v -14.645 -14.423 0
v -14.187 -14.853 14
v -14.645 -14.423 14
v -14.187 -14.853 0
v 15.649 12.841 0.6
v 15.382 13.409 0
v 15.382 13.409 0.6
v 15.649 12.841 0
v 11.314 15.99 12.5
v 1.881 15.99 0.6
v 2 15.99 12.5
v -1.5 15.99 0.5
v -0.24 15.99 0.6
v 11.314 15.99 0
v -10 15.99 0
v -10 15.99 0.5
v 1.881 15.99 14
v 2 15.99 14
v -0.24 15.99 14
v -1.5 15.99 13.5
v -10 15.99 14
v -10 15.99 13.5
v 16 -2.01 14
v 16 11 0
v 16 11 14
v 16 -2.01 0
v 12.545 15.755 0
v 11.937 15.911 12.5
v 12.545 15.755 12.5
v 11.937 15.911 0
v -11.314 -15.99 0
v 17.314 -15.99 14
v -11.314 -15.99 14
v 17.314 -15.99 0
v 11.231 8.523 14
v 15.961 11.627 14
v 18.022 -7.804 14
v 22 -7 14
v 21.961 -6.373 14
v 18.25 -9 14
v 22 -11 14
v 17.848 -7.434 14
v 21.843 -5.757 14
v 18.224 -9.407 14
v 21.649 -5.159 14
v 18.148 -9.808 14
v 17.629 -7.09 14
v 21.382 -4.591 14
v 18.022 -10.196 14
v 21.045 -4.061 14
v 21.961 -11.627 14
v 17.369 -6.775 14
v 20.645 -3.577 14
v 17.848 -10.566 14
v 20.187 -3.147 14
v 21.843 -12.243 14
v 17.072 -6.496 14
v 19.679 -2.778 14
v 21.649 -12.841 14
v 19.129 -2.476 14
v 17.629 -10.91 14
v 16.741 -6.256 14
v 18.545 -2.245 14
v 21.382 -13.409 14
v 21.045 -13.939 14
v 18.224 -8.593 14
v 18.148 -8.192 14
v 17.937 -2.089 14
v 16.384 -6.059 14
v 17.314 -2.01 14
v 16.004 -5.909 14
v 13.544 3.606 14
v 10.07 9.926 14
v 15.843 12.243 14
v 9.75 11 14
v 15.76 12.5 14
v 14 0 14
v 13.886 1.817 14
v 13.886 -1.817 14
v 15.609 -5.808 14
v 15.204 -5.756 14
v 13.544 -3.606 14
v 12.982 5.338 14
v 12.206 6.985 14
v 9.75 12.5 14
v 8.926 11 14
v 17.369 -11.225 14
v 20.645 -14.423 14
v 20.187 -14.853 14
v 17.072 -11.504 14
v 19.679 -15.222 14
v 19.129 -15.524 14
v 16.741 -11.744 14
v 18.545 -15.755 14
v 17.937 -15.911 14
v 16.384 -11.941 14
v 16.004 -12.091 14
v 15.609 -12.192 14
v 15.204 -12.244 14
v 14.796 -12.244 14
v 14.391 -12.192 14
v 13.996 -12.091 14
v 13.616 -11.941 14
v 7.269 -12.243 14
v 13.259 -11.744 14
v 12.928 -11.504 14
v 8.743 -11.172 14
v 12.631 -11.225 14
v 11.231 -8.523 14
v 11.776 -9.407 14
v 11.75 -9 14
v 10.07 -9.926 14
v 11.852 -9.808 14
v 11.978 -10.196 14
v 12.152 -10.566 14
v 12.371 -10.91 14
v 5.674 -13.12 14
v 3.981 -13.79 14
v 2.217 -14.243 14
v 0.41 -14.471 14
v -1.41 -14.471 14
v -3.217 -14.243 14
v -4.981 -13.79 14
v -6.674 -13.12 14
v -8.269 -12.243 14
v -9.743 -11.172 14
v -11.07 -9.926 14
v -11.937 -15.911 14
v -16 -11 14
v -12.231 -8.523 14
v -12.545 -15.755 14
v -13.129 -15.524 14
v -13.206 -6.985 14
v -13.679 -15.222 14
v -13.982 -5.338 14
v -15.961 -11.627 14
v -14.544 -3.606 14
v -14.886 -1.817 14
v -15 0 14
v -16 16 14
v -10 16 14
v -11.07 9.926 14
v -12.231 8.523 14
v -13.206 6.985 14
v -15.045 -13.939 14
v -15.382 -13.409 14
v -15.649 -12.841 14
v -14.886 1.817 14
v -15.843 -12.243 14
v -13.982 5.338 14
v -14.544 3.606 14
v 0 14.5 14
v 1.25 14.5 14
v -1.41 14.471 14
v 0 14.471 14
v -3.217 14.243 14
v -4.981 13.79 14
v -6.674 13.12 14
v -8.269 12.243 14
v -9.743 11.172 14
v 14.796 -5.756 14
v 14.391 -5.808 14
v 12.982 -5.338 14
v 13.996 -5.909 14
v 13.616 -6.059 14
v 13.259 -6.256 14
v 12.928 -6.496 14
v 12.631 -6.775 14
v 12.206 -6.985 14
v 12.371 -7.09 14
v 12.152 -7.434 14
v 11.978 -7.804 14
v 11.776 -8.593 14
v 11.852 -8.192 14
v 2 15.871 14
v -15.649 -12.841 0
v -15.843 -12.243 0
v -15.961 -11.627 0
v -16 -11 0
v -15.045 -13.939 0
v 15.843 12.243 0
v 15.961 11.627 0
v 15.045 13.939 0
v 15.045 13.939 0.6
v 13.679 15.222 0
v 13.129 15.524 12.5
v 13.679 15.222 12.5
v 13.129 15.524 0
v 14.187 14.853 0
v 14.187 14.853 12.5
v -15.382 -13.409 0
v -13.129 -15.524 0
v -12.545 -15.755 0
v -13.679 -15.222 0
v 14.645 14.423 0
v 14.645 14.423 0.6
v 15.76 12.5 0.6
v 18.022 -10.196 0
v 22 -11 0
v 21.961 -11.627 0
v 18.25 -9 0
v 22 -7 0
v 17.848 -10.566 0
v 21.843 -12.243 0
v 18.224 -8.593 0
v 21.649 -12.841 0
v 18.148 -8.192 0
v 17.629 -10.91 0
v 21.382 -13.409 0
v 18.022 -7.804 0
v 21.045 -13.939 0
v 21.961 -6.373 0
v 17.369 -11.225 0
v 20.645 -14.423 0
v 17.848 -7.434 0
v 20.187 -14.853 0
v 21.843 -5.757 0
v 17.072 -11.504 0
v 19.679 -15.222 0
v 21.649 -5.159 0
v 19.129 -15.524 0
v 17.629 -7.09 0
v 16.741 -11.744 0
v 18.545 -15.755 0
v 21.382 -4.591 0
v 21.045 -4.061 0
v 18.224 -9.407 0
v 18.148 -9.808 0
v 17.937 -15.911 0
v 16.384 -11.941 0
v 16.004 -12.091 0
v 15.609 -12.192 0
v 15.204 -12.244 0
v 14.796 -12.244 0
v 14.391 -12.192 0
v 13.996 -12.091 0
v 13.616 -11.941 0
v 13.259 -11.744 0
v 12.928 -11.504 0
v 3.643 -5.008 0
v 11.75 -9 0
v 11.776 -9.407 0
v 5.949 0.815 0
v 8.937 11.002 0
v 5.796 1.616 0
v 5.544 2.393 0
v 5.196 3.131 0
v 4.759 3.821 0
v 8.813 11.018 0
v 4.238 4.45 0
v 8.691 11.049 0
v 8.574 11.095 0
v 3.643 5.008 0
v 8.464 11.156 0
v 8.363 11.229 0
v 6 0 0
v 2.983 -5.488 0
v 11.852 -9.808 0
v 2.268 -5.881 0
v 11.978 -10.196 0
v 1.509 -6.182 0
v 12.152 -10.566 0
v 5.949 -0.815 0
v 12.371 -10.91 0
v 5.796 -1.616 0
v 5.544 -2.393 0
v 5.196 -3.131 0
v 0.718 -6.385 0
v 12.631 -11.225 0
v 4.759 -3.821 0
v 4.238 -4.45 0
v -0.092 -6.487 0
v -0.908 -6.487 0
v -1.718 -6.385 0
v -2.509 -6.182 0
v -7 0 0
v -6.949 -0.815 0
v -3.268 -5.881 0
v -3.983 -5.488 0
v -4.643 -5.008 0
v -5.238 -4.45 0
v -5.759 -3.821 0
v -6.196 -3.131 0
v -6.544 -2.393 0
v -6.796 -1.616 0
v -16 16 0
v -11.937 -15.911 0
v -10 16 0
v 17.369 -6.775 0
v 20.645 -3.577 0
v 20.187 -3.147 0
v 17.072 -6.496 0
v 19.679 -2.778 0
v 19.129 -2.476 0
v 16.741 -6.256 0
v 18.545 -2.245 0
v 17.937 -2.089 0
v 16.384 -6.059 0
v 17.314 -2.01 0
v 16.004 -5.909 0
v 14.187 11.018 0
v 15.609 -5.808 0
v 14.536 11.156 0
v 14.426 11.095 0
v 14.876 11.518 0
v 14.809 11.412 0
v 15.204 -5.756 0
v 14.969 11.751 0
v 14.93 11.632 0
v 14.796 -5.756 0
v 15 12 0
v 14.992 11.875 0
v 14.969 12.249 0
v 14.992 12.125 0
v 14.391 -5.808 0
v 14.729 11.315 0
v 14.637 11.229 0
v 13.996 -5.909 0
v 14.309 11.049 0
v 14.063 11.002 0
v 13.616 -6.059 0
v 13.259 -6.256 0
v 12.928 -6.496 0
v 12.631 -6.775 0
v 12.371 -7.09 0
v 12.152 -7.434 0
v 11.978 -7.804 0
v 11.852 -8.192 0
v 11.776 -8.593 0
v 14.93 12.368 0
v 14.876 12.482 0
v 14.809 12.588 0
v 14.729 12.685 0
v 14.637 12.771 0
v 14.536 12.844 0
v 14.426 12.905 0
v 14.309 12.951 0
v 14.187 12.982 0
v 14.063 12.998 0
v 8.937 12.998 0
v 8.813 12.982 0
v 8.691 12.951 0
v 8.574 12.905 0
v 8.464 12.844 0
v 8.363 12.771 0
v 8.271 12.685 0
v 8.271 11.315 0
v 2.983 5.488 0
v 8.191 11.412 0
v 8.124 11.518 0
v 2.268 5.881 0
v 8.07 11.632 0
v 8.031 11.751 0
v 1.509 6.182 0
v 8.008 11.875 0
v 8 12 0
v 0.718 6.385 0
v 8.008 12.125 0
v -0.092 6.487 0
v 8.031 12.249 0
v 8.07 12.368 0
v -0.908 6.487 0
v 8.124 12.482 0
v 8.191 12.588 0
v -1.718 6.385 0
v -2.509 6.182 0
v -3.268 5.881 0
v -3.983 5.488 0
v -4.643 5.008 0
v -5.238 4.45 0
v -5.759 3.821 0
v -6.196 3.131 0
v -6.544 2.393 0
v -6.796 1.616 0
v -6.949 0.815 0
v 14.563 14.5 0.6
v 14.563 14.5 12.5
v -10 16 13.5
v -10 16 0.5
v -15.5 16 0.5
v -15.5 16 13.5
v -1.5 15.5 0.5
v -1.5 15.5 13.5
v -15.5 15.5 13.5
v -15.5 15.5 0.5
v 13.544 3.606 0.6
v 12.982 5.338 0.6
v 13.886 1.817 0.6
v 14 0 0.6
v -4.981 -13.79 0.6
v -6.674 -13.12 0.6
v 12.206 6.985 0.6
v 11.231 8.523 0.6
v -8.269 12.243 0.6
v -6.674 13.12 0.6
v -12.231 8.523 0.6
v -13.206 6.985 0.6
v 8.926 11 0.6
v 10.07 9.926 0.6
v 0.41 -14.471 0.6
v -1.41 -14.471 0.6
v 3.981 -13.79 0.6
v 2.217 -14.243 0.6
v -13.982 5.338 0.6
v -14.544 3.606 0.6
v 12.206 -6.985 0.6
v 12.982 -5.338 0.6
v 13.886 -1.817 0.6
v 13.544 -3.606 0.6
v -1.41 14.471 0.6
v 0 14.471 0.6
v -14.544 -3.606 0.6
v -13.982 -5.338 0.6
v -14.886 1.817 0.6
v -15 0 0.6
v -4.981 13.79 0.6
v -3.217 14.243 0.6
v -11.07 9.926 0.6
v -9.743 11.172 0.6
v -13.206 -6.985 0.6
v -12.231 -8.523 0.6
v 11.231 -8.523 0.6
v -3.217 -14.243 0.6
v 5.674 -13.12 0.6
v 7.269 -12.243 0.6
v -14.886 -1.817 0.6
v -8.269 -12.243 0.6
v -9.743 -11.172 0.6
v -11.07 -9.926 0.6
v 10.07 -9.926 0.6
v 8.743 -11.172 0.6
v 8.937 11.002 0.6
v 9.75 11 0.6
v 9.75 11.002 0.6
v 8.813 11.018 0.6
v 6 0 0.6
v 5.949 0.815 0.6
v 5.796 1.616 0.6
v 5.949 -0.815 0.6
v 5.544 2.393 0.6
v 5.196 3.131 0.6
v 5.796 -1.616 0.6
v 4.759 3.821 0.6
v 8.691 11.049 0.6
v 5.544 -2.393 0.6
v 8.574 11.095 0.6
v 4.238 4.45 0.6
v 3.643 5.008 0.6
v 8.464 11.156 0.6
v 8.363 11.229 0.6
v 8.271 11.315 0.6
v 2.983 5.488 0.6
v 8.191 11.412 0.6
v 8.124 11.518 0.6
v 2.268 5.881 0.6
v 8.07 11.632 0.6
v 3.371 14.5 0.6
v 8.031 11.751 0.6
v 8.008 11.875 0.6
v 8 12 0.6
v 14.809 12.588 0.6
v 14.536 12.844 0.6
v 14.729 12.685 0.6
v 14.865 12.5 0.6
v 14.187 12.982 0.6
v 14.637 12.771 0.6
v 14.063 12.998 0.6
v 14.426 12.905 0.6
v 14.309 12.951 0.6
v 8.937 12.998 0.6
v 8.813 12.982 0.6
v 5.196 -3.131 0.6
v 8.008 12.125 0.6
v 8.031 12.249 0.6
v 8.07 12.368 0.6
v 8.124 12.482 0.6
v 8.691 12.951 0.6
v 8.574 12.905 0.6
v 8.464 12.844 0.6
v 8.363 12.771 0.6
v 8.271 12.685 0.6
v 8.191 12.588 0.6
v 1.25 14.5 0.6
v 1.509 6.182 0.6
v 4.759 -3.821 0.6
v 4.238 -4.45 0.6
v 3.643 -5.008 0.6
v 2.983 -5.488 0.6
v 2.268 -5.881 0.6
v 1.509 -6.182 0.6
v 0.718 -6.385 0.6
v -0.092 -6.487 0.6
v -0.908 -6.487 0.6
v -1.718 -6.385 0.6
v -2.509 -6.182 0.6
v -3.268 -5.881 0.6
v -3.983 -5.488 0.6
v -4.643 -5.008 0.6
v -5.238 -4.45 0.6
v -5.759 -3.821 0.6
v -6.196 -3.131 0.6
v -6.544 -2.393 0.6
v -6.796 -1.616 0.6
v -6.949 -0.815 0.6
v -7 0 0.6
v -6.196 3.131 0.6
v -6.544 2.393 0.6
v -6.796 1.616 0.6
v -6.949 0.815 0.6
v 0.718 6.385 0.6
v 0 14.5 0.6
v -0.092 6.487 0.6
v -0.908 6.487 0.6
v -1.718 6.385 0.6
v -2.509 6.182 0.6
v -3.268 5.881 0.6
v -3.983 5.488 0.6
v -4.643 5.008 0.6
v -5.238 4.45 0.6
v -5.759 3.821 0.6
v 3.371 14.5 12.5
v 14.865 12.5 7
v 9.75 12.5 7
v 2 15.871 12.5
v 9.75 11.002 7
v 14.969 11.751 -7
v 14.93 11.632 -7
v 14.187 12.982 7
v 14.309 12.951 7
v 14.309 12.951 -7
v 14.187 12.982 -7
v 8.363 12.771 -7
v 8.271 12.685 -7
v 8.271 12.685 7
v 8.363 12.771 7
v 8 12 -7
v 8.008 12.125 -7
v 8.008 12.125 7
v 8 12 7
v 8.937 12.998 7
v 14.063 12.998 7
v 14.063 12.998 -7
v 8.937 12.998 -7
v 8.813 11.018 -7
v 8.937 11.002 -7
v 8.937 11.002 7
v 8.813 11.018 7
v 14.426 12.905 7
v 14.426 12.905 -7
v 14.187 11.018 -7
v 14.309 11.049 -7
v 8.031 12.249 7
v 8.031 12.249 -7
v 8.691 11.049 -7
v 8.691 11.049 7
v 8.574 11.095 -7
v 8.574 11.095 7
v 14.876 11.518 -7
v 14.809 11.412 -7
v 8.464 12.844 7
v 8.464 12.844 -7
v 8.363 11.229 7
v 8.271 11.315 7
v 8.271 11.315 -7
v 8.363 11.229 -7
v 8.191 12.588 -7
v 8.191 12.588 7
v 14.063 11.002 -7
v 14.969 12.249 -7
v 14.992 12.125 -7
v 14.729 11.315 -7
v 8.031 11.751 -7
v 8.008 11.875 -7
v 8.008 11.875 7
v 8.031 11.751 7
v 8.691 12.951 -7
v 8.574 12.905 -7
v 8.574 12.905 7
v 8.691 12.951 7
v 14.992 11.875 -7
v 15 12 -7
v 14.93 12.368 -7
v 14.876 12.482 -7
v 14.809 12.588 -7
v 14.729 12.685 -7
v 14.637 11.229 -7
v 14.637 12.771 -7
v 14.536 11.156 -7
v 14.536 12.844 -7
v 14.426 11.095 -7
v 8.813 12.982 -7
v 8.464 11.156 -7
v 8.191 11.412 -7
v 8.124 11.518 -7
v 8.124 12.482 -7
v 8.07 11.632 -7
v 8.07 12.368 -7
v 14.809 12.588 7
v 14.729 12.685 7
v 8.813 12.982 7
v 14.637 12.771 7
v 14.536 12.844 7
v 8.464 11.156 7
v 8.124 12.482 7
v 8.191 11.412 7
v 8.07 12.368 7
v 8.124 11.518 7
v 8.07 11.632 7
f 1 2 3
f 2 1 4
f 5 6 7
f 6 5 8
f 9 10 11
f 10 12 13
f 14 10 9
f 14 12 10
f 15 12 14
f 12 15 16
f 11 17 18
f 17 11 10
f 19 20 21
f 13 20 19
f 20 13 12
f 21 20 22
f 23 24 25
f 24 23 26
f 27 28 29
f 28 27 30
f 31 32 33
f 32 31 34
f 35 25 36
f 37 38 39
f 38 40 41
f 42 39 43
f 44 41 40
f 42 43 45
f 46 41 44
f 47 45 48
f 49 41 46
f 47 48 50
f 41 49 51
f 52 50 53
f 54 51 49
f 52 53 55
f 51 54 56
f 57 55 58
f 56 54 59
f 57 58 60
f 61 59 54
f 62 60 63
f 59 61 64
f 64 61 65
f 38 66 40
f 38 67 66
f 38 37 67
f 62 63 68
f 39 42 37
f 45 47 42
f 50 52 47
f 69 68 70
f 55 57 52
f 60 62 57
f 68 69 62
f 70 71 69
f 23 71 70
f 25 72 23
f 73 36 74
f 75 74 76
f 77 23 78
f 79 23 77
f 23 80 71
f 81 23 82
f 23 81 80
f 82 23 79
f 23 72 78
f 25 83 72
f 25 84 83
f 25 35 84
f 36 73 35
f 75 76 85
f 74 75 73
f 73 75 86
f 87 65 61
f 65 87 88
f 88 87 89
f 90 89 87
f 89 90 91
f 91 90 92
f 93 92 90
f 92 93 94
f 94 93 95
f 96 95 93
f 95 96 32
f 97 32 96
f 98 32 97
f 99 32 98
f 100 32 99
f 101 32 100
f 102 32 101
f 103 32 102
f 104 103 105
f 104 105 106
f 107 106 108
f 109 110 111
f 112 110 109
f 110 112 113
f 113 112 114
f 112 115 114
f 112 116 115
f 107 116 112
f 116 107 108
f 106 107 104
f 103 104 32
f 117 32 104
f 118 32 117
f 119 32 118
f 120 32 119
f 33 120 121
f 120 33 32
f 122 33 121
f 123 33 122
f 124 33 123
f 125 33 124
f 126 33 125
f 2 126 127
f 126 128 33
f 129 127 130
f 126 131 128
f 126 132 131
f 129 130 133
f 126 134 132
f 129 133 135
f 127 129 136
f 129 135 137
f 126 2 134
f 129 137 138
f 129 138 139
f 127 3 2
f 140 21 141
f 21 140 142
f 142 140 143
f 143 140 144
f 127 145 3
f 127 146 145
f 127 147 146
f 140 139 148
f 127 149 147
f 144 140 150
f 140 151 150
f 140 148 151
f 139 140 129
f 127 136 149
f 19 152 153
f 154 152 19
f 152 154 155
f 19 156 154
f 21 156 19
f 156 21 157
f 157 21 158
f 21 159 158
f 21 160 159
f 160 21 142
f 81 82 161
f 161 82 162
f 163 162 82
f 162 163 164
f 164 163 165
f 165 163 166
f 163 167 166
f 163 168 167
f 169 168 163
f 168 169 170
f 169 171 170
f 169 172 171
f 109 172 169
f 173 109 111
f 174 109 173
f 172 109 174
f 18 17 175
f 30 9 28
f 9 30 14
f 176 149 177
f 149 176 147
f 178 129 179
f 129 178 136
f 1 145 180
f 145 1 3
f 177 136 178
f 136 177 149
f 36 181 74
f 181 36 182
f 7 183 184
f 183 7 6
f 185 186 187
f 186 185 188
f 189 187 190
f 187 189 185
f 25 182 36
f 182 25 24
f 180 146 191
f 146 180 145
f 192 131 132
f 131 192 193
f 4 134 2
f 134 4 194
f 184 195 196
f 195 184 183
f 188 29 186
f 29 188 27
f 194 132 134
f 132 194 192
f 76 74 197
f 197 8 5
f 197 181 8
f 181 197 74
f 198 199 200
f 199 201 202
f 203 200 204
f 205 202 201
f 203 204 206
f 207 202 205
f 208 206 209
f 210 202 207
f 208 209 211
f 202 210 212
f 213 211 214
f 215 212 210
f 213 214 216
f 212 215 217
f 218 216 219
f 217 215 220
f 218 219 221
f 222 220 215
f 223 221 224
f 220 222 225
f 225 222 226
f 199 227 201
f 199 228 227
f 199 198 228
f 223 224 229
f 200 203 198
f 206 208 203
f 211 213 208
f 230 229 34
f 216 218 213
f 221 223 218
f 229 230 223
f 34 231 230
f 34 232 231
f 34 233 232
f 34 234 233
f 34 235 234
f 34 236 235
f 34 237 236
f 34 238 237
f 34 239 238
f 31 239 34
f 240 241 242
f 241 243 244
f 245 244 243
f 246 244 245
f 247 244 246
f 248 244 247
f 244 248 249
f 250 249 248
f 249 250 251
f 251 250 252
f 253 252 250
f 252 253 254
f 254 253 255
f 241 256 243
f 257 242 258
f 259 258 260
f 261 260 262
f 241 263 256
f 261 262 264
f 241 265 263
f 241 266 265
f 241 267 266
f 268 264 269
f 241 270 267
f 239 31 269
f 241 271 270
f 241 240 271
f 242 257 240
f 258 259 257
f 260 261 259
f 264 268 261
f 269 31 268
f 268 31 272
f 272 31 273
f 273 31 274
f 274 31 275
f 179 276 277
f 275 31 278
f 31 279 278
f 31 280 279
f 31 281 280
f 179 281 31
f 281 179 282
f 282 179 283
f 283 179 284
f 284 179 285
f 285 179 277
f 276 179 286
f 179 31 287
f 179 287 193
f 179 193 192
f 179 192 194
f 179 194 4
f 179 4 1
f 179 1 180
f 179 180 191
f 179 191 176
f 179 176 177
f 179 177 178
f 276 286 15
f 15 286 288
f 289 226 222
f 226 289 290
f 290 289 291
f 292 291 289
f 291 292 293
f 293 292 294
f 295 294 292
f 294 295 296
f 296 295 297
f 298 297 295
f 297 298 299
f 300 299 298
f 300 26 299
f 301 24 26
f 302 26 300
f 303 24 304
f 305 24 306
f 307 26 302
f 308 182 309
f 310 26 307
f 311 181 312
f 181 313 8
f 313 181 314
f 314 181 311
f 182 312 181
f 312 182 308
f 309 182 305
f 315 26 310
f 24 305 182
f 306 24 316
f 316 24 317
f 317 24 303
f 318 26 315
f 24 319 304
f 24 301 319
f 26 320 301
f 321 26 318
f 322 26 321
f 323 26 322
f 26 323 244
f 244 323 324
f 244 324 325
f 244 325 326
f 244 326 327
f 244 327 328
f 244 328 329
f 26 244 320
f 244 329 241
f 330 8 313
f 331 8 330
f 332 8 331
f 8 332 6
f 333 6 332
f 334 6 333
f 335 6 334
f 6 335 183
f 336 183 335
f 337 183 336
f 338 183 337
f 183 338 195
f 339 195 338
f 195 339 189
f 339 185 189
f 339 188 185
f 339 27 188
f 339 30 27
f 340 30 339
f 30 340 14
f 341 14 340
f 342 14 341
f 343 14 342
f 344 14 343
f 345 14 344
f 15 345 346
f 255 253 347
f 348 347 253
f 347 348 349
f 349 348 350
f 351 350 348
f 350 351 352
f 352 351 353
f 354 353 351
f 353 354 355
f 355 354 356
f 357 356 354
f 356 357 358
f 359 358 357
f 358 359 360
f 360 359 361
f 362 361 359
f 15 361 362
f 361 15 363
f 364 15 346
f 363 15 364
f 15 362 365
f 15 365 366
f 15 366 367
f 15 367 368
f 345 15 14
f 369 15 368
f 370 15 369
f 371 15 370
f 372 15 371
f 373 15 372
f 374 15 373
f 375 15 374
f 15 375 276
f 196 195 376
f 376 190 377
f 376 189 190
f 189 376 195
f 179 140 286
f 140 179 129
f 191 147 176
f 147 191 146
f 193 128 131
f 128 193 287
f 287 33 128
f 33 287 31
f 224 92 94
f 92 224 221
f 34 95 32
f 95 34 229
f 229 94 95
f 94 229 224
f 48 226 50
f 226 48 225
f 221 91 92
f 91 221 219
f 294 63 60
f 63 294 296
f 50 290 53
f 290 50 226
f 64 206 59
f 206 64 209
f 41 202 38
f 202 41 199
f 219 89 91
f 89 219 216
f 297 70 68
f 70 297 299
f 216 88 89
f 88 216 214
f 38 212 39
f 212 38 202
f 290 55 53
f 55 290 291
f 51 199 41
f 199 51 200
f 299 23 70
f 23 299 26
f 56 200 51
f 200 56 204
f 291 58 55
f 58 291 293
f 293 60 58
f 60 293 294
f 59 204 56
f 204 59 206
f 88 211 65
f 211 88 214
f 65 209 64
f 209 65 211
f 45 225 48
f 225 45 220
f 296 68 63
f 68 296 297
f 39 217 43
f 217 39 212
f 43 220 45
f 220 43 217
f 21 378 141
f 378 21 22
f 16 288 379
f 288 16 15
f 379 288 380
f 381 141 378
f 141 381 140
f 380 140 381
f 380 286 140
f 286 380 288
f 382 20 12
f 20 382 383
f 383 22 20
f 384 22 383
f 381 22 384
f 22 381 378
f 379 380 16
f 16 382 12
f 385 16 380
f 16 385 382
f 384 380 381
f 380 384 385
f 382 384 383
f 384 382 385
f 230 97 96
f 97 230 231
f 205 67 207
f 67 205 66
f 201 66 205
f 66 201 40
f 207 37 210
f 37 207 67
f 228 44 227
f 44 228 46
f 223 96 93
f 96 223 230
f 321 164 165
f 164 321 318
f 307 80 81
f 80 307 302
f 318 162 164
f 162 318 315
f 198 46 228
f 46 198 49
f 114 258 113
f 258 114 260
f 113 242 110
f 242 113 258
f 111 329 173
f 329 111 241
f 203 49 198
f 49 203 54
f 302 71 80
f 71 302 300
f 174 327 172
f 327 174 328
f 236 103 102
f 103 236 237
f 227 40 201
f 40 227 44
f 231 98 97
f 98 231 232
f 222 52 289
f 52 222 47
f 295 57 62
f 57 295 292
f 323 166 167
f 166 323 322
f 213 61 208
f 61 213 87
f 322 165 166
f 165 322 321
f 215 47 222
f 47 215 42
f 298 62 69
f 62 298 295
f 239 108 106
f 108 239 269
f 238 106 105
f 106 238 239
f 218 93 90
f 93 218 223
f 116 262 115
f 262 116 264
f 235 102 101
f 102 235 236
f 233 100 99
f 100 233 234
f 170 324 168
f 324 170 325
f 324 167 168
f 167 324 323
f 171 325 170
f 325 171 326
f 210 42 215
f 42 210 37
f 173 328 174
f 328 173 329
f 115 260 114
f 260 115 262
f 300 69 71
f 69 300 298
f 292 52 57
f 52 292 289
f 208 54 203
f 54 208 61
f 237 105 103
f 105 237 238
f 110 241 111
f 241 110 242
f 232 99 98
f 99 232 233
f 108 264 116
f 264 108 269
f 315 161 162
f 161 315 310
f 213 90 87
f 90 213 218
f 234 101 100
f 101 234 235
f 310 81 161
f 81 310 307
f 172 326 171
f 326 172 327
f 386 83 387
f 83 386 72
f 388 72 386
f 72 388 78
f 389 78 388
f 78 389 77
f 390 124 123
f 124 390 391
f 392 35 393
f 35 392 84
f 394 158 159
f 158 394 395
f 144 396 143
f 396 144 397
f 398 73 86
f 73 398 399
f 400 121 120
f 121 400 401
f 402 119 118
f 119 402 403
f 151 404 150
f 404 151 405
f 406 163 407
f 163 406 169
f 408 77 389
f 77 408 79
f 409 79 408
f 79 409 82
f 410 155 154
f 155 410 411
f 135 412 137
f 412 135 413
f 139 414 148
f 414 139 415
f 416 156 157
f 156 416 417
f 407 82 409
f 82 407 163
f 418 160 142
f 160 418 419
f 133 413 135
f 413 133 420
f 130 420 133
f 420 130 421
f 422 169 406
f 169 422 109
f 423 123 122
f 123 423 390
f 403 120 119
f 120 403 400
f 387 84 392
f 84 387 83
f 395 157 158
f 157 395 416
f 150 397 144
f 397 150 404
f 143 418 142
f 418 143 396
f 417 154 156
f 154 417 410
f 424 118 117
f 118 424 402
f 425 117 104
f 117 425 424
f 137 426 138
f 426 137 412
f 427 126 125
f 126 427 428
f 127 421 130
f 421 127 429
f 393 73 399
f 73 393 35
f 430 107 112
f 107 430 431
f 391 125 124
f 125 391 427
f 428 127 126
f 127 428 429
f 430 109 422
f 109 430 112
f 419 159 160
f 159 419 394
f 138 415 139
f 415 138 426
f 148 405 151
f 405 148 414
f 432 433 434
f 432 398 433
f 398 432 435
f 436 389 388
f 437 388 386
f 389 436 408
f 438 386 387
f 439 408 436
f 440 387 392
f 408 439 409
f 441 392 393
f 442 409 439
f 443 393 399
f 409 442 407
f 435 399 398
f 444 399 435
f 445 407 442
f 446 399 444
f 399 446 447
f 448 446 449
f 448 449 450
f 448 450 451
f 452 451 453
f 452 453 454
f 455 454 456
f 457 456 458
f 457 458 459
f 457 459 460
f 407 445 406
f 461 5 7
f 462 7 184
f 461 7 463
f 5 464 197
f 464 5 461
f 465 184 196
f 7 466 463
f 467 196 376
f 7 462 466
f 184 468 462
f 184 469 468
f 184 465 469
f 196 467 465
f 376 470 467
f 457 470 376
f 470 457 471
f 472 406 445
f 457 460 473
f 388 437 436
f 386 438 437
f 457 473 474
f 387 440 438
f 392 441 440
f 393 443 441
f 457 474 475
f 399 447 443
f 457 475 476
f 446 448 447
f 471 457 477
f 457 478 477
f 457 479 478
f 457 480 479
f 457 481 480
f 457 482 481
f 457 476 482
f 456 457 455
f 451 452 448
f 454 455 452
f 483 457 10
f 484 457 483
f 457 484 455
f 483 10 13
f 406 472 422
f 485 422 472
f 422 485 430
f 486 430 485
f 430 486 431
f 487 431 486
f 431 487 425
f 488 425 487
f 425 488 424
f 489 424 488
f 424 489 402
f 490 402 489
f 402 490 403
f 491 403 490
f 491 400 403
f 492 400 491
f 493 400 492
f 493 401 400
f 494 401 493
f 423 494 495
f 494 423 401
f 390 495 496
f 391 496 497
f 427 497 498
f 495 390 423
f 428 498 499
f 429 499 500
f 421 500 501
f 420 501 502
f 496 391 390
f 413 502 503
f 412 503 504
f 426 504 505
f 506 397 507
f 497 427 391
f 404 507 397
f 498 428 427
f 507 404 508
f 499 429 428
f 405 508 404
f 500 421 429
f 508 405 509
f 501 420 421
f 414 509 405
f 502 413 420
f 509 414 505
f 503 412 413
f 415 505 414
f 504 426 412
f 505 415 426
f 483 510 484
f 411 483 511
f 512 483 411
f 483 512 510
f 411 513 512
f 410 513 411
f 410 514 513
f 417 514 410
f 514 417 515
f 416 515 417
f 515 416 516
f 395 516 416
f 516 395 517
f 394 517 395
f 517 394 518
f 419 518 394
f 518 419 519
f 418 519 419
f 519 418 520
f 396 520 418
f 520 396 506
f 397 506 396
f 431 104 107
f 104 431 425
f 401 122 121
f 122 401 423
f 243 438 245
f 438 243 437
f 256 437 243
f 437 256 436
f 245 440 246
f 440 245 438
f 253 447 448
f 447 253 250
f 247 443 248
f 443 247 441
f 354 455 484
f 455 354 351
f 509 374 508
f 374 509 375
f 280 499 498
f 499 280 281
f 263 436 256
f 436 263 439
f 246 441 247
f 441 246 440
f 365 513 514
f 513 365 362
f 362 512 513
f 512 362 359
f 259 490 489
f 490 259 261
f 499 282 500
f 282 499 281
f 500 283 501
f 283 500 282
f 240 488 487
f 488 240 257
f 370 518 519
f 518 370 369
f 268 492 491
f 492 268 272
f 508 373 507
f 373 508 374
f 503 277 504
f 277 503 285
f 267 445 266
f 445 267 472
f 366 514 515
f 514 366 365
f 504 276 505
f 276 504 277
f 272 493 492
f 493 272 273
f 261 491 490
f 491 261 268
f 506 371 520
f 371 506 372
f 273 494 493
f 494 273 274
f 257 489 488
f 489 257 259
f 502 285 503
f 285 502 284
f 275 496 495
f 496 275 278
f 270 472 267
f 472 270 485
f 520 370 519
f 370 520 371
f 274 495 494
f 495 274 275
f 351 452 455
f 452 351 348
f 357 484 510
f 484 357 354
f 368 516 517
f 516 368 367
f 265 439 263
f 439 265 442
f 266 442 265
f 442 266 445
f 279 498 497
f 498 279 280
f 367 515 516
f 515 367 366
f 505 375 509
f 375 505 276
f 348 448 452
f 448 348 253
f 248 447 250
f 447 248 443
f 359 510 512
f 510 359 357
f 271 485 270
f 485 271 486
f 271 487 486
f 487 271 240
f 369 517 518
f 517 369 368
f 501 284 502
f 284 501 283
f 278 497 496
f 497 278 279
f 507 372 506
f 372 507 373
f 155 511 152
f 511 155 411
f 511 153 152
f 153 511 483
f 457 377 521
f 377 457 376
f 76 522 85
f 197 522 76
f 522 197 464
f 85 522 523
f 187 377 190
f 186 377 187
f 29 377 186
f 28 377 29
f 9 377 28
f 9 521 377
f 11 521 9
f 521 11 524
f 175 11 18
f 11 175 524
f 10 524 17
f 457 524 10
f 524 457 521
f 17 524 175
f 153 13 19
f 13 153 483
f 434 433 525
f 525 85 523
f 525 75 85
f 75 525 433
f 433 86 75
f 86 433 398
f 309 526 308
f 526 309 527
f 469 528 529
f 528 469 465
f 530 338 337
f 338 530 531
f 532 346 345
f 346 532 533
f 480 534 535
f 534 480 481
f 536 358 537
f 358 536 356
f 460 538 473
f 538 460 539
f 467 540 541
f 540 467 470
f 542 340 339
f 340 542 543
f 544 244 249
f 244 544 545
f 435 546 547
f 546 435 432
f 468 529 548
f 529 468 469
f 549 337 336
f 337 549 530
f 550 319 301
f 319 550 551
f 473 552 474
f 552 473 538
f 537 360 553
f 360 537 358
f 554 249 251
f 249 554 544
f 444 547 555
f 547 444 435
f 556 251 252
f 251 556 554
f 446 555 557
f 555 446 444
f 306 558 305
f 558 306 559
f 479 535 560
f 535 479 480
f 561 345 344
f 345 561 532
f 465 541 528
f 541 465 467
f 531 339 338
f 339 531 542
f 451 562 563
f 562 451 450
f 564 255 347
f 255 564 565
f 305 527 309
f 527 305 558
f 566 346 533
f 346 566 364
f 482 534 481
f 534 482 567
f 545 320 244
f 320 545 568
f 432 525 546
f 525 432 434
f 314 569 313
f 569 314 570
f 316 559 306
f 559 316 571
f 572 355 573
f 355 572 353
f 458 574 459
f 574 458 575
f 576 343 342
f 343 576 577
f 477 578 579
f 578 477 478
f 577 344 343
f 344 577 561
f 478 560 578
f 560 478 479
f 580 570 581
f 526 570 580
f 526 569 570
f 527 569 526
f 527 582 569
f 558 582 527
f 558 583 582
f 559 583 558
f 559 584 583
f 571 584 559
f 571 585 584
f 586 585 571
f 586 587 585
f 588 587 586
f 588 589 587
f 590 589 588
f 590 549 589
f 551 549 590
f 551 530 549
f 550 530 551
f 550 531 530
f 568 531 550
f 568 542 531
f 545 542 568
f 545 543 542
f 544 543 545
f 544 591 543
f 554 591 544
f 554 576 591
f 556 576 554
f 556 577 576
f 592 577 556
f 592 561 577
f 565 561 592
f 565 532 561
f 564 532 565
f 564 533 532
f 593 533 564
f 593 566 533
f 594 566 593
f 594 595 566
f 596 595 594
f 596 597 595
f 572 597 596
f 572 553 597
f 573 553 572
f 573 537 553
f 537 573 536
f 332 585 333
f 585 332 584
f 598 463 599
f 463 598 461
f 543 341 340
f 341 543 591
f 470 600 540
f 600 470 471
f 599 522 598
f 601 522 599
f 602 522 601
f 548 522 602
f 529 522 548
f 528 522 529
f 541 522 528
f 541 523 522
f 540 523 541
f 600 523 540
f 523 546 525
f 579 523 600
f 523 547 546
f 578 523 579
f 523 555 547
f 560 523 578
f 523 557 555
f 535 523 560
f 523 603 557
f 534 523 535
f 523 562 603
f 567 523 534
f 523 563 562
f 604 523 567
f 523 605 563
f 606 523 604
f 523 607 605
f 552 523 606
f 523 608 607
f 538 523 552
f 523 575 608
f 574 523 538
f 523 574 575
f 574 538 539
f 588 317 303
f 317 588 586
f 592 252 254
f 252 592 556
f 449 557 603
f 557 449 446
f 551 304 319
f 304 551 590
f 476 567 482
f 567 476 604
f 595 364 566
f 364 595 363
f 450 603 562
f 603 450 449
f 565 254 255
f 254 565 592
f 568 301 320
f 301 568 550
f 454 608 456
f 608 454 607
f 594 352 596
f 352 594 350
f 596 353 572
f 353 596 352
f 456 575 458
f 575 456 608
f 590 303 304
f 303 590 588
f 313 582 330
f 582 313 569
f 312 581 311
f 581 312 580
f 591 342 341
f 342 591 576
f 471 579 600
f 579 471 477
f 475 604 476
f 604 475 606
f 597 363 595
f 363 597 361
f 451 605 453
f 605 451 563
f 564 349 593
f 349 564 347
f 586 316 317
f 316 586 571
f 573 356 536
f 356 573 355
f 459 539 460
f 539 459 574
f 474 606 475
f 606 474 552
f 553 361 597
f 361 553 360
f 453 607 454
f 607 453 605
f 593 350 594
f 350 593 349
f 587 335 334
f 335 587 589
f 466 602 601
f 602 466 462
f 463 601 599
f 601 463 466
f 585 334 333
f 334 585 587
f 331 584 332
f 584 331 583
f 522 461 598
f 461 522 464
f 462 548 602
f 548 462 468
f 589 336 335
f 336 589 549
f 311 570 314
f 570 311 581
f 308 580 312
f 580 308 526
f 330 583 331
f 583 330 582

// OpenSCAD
$fn = 50;


union() {
	difference() {
		union() {
			hull() {
				translate(v = [-11.0000000000, 11.0000000000, 0]) {
					cylinder(h = 14, r = 5);
				}
				translate(v = [11.0000000000, 11.0000000000, 0]) {
					cylinder(h = 14, r = 5);
				}
				translate(v = [-11.0000000000, -11.0000000000, 0]) {
					cylinder(h = 14, r = 5);
				}
				translate(v = [11.0000000000, -11.0000000000, 0]) {
					cylinder(h = 14, r = 5);
				}
			}
			translate(v = [7.5000000000, -9.0000000000, 0]) {
				hull() {
					translate(v = [-9.5000000000, 2.0000000000, 0]) {
						cylinder(h = 14, r = 5);
					}
					translate(v = [9.5000000000, 2.0000000000, 0]) {
						cylinder(h = 14, r = 5);
					}
					translate(v = [-9.5000000000, -2.0000000000, 0]) {
						cylinder(h = 14, r = 5);
					}
					translate(v = [9.5000000000, -2.0000000000, 0]) {
						cylinder(h = 14, r = 5);
					}
				}
			}
			translate(v = [-16.0000000000, 10.0000000000, 0]) {
				cube(size = [6, 6, 14]);
			}
		}
		union() {
			translate(v = [-15.5000000000, 15.5000000000, 0.5000000000]) {
				cube(size = [14, 0.5000000000, 13.0000000000]);
			}
			translate(v = [15.0000000000, -9.0000000000, -100.0000000000]) {
				cylinder(h = 200, r = 3.2500000000);
			}
			translate(v = [-0.5000000000, 0.0000000000, 0.6000000000]) {
				cylinder(h = 16.4000000000, r = 14.5000000000);
			}
			translate(v = [-0.5000000000, 0.0000000000, -7.0000000000]) {
				cylinder(h = 14, r = 6.5000000000);
			}
			translate(v = [0.0000000000, 12.5000000000, 0.6000000000]) {
				cube(size = [16.0000000000, 2, 16.4000000000]);
			}
			translate(v = [2.0000000000, 12.5000000000, 12.5000000000]) {
				cube(size = [14.0000000000, 5, 1.5000000000]);
			}
			translate(v = [-3.0000000000, 18.7500000000, 0.6000000000]) {
				rotate(a = [0, 0, -45]) {
					cube(size = [10, 1.5000000000, 16.4000000000]);
				}
			}
			translate(v = [2.2500000000, 11.0000000000, 0.6000000000]) {
				cube(size = [7.5000000000, 2, 13.4000000000]);
			}
		}
	}
	union() {
		translate(v = [11.5000000000, 12, -7.0000000000]) {
			rotate(a = [0, 0, 0]) {
				difference() {
					union() {
						hull() {
							translate(v = [2.5000000000, 0, 0]) {
								cylinder(h = 14, r = 1.0000000000, r1 = 1.0000000000, r2 = 1.0000000000);
							}
							translate(v = [-2.5000000000, 0, 0]) {
								cylinder(h = 14, r = 1.0000000000, r1 = 1.0000000000, r2 = 1.0000000000);
							}
						}
					}
					union();
				}
			}
		}
	}
}
